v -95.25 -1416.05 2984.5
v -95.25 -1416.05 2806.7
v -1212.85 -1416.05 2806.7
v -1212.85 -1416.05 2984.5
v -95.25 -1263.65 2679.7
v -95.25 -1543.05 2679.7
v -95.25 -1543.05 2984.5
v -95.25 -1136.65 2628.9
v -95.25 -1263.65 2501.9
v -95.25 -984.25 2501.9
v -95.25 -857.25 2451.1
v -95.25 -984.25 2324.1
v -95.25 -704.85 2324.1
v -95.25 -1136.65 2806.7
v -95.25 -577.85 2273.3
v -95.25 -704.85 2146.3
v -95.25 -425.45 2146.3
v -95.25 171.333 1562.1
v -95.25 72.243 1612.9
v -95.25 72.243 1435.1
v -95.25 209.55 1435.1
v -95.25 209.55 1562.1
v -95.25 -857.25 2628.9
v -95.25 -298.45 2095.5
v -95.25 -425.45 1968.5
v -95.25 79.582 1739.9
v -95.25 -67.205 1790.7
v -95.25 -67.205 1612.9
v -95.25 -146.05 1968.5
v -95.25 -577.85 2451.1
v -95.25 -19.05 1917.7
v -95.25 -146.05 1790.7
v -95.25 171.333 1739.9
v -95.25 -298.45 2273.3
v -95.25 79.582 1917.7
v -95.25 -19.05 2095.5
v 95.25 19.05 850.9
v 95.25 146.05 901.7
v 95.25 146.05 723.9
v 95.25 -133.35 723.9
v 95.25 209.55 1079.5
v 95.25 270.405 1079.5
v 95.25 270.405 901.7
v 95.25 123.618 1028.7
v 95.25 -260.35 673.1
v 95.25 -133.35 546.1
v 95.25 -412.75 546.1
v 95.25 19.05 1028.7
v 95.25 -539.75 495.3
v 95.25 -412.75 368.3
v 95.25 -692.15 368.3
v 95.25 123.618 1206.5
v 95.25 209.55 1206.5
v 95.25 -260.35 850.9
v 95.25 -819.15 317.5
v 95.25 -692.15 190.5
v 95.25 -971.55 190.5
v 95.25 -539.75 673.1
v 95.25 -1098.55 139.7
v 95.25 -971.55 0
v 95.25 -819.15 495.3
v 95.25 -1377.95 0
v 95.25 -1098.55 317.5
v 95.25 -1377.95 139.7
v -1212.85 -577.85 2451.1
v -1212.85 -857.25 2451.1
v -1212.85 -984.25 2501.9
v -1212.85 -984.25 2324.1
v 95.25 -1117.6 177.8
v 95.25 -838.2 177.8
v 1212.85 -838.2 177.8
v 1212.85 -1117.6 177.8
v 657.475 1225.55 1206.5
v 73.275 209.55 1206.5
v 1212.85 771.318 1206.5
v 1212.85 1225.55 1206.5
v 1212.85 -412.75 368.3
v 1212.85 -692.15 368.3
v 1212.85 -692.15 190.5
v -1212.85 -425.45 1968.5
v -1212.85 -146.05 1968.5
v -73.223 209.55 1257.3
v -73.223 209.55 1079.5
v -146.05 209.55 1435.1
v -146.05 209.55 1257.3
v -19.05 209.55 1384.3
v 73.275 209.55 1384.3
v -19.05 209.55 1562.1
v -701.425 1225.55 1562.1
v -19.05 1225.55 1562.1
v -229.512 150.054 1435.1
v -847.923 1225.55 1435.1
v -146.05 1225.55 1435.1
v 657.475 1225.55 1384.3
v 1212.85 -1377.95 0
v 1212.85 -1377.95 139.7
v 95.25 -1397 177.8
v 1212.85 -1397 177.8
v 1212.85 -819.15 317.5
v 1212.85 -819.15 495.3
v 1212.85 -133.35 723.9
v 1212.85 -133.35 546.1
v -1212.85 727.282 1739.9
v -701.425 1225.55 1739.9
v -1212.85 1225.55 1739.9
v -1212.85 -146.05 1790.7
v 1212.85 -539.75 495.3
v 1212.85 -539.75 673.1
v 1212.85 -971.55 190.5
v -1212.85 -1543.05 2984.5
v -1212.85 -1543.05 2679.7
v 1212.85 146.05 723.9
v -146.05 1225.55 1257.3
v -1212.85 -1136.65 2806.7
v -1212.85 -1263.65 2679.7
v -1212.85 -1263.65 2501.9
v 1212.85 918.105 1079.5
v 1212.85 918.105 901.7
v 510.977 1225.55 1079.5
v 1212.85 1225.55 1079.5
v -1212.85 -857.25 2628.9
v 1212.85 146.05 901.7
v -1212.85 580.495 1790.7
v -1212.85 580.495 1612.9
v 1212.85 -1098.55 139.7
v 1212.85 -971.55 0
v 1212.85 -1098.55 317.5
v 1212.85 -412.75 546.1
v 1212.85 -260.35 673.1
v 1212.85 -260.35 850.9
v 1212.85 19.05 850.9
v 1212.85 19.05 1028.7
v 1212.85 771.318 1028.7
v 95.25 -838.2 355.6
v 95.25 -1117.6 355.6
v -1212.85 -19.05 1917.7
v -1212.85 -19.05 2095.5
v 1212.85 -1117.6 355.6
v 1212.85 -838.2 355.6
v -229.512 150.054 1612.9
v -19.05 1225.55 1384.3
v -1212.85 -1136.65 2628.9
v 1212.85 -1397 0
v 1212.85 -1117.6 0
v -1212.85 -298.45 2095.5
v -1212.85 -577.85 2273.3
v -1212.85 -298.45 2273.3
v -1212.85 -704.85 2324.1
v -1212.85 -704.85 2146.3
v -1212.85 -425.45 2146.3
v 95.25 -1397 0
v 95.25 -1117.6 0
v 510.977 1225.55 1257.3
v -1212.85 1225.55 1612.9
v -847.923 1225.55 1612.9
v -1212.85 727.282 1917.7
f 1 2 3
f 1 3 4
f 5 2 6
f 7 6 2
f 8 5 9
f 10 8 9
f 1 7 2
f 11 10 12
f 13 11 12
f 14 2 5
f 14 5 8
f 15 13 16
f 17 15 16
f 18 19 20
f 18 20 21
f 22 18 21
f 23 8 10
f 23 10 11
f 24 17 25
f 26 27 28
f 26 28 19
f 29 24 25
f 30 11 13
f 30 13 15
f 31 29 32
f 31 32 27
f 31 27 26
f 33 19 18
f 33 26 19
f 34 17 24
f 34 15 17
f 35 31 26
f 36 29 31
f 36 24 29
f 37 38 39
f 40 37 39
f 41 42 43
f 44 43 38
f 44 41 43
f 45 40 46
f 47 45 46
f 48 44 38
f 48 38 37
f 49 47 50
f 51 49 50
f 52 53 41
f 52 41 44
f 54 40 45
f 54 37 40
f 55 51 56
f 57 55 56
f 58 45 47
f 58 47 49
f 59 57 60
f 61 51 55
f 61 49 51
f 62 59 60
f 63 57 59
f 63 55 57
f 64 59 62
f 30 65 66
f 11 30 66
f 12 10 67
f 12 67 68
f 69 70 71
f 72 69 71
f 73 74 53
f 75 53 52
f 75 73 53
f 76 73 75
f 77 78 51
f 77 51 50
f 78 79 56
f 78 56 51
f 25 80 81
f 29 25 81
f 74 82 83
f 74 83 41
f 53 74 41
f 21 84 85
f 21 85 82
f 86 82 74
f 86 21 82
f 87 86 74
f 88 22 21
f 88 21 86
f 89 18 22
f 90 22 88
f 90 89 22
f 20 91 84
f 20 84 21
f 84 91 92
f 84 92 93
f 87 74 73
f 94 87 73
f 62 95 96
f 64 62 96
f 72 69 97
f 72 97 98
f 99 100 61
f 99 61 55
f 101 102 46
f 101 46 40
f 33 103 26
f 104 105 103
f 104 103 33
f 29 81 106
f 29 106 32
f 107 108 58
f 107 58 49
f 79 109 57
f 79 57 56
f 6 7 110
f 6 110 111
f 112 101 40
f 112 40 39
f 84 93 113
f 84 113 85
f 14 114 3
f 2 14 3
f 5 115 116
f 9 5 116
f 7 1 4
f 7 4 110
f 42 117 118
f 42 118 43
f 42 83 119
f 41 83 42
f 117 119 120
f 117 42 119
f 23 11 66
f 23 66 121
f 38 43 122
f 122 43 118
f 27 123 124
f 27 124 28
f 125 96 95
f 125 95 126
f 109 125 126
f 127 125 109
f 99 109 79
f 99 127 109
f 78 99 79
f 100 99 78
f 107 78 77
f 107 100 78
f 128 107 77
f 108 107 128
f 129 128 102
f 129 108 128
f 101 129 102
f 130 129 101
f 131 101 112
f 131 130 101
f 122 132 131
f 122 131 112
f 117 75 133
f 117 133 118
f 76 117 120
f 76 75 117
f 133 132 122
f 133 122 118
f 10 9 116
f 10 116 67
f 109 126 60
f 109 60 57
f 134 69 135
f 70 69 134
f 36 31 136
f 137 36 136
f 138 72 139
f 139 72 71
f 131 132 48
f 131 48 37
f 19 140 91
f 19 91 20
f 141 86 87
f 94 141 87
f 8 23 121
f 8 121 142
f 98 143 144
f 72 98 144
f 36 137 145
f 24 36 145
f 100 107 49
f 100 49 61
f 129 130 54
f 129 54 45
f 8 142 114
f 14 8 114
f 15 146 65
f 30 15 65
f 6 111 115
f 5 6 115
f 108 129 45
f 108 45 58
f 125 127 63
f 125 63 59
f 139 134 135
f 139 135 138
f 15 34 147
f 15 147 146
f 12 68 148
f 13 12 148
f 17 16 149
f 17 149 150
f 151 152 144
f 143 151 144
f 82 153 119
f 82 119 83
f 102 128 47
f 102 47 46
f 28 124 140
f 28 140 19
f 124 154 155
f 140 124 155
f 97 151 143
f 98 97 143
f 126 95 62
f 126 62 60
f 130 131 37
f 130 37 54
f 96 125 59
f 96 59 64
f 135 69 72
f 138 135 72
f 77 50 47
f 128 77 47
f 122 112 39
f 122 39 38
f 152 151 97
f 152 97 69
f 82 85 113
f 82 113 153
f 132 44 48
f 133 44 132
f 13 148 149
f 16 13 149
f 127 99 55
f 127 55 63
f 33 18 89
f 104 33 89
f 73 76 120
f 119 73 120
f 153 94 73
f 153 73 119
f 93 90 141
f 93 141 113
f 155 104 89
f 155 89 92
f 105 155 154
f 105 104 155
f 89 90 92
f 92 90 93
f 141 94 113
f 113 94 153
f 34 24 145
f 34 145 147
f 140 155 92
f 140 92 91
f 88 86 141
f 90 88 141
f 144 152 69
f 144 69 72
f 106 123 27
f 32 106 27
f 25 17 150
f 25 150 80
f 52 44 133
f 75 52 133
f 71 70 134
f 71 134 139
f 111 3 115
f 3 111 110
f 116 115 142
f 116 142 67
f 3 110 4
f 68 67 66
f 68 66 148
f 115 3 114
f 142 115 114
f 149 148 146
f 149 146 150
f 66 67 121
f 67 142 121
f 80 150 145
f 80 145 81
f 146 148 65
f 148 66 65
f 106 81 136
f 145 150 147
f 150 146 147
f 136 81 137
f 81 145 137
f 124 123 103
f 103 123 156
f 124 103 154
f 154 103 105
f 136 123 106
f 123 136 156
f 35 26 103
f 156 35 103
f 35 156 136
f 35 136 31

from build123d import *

# Parameters (mm, degrees)
F4_W           = 1117.6
F4_H           = 279.4
F6_DEPTH       = 177.8
F7_START       = 177.8
F7_DEPTH       = 177.8
F8_W           = 260.35
F8_H           = 139.7
F9_DEPTH       = 1117.6
F11_DEPTH      = 127
F12_DEPTH      = 177.8
F12_DEPTH_BACK = 127
F14_DEPTH      = 127
F15_DEPTH      = 177.8
F15_DEPTH_BACK = 127
F17_DEPTH      = 127
F18_DEPTH      = 177.8
F18_DEPTH_BACK = 127
F20_DEPTH      = 127
F21_DEPTH      = 177.8
F21_DEPTH_BACK = 127
F23_DEPTH      = 127
F24_DEPTH      = 177.8
F24_DEPTH_BACK = 127
F26_DEPTH      = 127
F27_DEPTH      = 177.8
F27_DEPTH_BACK = 127
F29_DEPTH      = 1117.6
F31_DEPTH      = 177.8


# Not quite as in the source:
# - a variable given as a bare number and used for a length is read in inches; the dataset says mm whatever the document's units were
# - a feature names something its author has since deleted; it is built from what else it names


with BuildPart() as f6:
    # F4 (on Top) → F6 (new body)
    with BuildSketch(Plane.XY):
        with Locations((654.05, -1257.3)):
            Rectangle(F4_W, F4_H)
    extrude(amount=F6_DEPTH)


with BuildPart() as f7:
    # F4 (on Top) → F7 (new body)
    with BuildSketch(Plane.XY.offset(F7_START)):
        with Locations((654.05, -977.9)):
            Rectangle(F4_W, F4_H)
    extrude(amount=F7_DEPTH)


with BuildPart() as f9:
    # F8 (on face) → F9 (new body)
    with BuildSketch(Plane.YZ.offset(1212.85)):
        Polygon((-1098.55, 139.7), (-1117.6, 139.7), (-1117.6, 0), (-971.55, 0), (-971.55, 190.5), (-692.15, 190.5), (-692.15, 368.3), (-412.75, 368.3), (-412.75, 546.1), (-133.35, 546.1), (-133.35, 723.9), (146.05, 723.9), (146.05, 1028.7), (19.05, 1028.7), (19.05, 850.9), (-260.35, 850.9), (-260.35, 673.1), (-539.75, 673.1), (-539.75, 495.3), (-819.15, 495.3), (-819.15, 317.5), (-1098.55, 317.5), align=None)
        with Locations((-1247.775, 69.85)):
            Rectangle(F8_W, F8_H)
    extrude(amount=-F9_DEPTH)

    # F10 (on face) → F11 (join)
    with BuildSketch(Plane.XY.offset(1028.7)):
        Polygon((1212.85, 771.3179841809), (133.9562233742, 146.05), (1212.85, 146.05), align=None)
    extrude(amount=-F11_DEPTH)

    # F10 (on face) → F12 (join, two sides)
    with BuildSketch(Plane.XY.offset(1028.7)) as f12_sk:
        Polygon((95.25, 146.05), (133.9562233742, 146.05), (1212.85, 771.3179841809), (1212.85, 918.1045453867), (-9.7539214515, 209.55), (95.25, 209.55), align=None)
        Polygon((95.25, 146.05), (95.25, 123.6179841809), (133.9562233742, 146.05), align=None)
    extrude(amount=F12_DEPTH)
    extrude(f12_sk.sketch, amount=-F12_DEPTH_BACK)

    # F13 (on face) → F14 (join)
    with BuildSketch(Plane.XY.offset(1206.5)):
        Polygon((1212.85, 1225.55), (657.4753068494, 1225.55), (114.7722326257, 281.7185665675), (1212.85, 918.1045453867), align=None)
    extrude(amount=-F14_DEPTH)

    # F13 (on face) → F15 (join, two sides)
    with BuildSketch(Plane.XY.offset(1206.5)) as f15_sk:
        Polygon((657.4753068494, 1225.55), (510.9773525122, 1225.55), (-73.2226474878, 209.55), (-9.7539214515, 209.55), (114.7722326257, 281.7185665675), align=None)
        Polygon((114.7722326257, 281.7185665675), (-9.7539214515, 209.55), (73.2753068494, 209.55), align=None)
    extrude(amount=F15_DEPTH)
    extrude(f15_sk.sketch, amount=-F15_DEPTH_BACK)

    # F16 (on face) → F17 (join)
    with BuildSketch(Plane.XY.offset(1384.3)):
        Polygon((510.9773525122, 1225.55), (-19.05, 1225.55), (-19.05, 303.7632999789), align=None)
    extrude(amount=-F17_DEPTH)

    # F16 (on face) → F18 (join, two sides)
    with BuildSketch(Plane.XY.offset(1384.3)) as f18_sk:
        Polygon((-19.05, 1225.55), (-146.05, 1225.55), (-146.05, 209.55), (-73.2226474878, 209.55), (-19.05, 303.7632999789), align=None)
        Polygon((-19.05, 303.7632999789), (-73.2226474878, 209.55), (-19.05, 209.55), align=None)
    extrude(amount=F18_DEPTH)
    extrude(f18_sk.sketch, amount=-F18_DEPTH_BACK)

    # F19 (on face) → F20 (join)
    with BuildSketch(Plane.XY.offset(1562.1)):
        Polygon((-146.05, 1225.55), (-701.4246931506, 1225.55), (-146.05, 259.6809684338), align=None)
        Polygon((-95.25, 209.55), (-117.2246931506, 209.55), (-95.25, 171.3331423468), align=None)
    extrude(amount=-F20_DEPTH)

    # F19 (on face) → F21 (join, two sides)
    with BuildSketch(Plane.XY.offset(1562.1)) as f21_sk:
        Polygon((-146.05, 259.6809684338), (-701.4246931506, 1225.55), (-847.9226474878, 1225.55), (-229.5123430682, 150.0538184006), (-95.25, 72.2426877588), (-95.25, 171.3331423468), (-117.2246931506, 209.55), (-146.05, 209.55), align=None)
        Polygon((-117.2246931506, 209.55), (-146.05, 259.6809684338), (-146.05, 209.55), align=None)
    extrude(amount=F21_DEPTH)
    extrude(f21_sk.sketch, amount=-F21_DEPTH_BACK)

    # F22 (on face) → F23 (join)
    with BuildSketch(Plane.XY.offset(1739.9)):
        Polygon((-235.841614476, 161.0612469359), (-847.9226474878, 1225.55), (-1212.85, 1225.55), (-1212.85, 727.2820158191), align=None)
    extrude(amount=-F23_DEPTH)

    # F22 (on face) → F24 (join, two sides)
    with BuildSketch(Plane.XY.offset(1739.9)) as f24_sk:
        Polygon((-229.5123430682, 150.0538184006), (-235.841614476, 161.0612469359), (-1212.85, 727.2820158191), (-1212.85, 580.4954546133), (-95.25, -67.2045453867), (-95.25, 72.2426877588), align=None)
        Polygon((-95.25, 79.5820158191), (-235.841614476, 161.0612469359), (-229.5123430682, 150.0538184006), (-95.25, 72.2426877588), align=None)
    extrude(amount=F24_DEPTH)
    extrude(f24_sk.sketch, amount=-F24_DEPTH_BACK)

    # F25 (on face) → F26 (join)
    with BuildSketch(Plane.XY.offset(1917.7)):
        Polygon((-178.3401959613, -19.05), (-1212.85, 580.4954546133), (-1212.85, -19.05), align=None)
    extrude(amount=-F26_DEPTH)

    # F25 (on face) → F27 (join, two sides)
    with BuildSketch(Plane.XY.offset(1917.7)) as f27_sk:
        Polygon((-178.3401959613, -19.05), (-1212.85, -19.05), (-1212.85, -146.05), (-95.25, -146.05), (-95.25, -67.2045453867), align=None)
        Polygon((-95.25, -19.05), (-178.3401959613, -19.05), (-95.25, -67.2045453867), align=None)
    extrude(amount=F27_DEPTH)
    extrude(f27_sk.sketch, amount=-F27_DEPTH_BACK)

    # F28 (on face) → F29 (join)
    with BuildSketch(Plane.YZ.offset(-95.25)):
        Polygon((-146.05, 1968.5), (-146.05, 2095.5), (-298.45, 2095.5), (-298.45, 2273.3), (-577.85, 2273.3), (-577.85, 2451.1), (-857.25, 2451.1), (-857.25, 2628.9), (-1136.65, 2628.9), (-1136.65, 2806.7), (-1416.05, 2806.7), (-1416.05, 2984.5), (-1543.05, 2984.5), (-1543.05, 2679.7), (-1263.65, 2679.7), (-1263.65, 2501.9), (-984.25, 2501.9), (-984.25, 2324.1), (-704.85, 2324.1), (-704.85, 2146.3), (-425.45, 2146.3), (-425.45, 1968.5), align=None)
    extrude(amount=-F29_DEPTH)

    # F30 (on face) → F31 (cut)
    with BuildSketch(Plane(origin=(0, 0, 901.7), x_dir=(1, 0, 0), z_dir=(0, 0, -1))):
        Polygon((95.25, -270.4045453867), (95.25, -209.55), (-9.7539214515, -209.55), align=None)
    extrude(amount=-F31_DEPTH, mode=Mode.SUBTRACT)


solid = Compound([f6.part, f7.part, f9.part])
